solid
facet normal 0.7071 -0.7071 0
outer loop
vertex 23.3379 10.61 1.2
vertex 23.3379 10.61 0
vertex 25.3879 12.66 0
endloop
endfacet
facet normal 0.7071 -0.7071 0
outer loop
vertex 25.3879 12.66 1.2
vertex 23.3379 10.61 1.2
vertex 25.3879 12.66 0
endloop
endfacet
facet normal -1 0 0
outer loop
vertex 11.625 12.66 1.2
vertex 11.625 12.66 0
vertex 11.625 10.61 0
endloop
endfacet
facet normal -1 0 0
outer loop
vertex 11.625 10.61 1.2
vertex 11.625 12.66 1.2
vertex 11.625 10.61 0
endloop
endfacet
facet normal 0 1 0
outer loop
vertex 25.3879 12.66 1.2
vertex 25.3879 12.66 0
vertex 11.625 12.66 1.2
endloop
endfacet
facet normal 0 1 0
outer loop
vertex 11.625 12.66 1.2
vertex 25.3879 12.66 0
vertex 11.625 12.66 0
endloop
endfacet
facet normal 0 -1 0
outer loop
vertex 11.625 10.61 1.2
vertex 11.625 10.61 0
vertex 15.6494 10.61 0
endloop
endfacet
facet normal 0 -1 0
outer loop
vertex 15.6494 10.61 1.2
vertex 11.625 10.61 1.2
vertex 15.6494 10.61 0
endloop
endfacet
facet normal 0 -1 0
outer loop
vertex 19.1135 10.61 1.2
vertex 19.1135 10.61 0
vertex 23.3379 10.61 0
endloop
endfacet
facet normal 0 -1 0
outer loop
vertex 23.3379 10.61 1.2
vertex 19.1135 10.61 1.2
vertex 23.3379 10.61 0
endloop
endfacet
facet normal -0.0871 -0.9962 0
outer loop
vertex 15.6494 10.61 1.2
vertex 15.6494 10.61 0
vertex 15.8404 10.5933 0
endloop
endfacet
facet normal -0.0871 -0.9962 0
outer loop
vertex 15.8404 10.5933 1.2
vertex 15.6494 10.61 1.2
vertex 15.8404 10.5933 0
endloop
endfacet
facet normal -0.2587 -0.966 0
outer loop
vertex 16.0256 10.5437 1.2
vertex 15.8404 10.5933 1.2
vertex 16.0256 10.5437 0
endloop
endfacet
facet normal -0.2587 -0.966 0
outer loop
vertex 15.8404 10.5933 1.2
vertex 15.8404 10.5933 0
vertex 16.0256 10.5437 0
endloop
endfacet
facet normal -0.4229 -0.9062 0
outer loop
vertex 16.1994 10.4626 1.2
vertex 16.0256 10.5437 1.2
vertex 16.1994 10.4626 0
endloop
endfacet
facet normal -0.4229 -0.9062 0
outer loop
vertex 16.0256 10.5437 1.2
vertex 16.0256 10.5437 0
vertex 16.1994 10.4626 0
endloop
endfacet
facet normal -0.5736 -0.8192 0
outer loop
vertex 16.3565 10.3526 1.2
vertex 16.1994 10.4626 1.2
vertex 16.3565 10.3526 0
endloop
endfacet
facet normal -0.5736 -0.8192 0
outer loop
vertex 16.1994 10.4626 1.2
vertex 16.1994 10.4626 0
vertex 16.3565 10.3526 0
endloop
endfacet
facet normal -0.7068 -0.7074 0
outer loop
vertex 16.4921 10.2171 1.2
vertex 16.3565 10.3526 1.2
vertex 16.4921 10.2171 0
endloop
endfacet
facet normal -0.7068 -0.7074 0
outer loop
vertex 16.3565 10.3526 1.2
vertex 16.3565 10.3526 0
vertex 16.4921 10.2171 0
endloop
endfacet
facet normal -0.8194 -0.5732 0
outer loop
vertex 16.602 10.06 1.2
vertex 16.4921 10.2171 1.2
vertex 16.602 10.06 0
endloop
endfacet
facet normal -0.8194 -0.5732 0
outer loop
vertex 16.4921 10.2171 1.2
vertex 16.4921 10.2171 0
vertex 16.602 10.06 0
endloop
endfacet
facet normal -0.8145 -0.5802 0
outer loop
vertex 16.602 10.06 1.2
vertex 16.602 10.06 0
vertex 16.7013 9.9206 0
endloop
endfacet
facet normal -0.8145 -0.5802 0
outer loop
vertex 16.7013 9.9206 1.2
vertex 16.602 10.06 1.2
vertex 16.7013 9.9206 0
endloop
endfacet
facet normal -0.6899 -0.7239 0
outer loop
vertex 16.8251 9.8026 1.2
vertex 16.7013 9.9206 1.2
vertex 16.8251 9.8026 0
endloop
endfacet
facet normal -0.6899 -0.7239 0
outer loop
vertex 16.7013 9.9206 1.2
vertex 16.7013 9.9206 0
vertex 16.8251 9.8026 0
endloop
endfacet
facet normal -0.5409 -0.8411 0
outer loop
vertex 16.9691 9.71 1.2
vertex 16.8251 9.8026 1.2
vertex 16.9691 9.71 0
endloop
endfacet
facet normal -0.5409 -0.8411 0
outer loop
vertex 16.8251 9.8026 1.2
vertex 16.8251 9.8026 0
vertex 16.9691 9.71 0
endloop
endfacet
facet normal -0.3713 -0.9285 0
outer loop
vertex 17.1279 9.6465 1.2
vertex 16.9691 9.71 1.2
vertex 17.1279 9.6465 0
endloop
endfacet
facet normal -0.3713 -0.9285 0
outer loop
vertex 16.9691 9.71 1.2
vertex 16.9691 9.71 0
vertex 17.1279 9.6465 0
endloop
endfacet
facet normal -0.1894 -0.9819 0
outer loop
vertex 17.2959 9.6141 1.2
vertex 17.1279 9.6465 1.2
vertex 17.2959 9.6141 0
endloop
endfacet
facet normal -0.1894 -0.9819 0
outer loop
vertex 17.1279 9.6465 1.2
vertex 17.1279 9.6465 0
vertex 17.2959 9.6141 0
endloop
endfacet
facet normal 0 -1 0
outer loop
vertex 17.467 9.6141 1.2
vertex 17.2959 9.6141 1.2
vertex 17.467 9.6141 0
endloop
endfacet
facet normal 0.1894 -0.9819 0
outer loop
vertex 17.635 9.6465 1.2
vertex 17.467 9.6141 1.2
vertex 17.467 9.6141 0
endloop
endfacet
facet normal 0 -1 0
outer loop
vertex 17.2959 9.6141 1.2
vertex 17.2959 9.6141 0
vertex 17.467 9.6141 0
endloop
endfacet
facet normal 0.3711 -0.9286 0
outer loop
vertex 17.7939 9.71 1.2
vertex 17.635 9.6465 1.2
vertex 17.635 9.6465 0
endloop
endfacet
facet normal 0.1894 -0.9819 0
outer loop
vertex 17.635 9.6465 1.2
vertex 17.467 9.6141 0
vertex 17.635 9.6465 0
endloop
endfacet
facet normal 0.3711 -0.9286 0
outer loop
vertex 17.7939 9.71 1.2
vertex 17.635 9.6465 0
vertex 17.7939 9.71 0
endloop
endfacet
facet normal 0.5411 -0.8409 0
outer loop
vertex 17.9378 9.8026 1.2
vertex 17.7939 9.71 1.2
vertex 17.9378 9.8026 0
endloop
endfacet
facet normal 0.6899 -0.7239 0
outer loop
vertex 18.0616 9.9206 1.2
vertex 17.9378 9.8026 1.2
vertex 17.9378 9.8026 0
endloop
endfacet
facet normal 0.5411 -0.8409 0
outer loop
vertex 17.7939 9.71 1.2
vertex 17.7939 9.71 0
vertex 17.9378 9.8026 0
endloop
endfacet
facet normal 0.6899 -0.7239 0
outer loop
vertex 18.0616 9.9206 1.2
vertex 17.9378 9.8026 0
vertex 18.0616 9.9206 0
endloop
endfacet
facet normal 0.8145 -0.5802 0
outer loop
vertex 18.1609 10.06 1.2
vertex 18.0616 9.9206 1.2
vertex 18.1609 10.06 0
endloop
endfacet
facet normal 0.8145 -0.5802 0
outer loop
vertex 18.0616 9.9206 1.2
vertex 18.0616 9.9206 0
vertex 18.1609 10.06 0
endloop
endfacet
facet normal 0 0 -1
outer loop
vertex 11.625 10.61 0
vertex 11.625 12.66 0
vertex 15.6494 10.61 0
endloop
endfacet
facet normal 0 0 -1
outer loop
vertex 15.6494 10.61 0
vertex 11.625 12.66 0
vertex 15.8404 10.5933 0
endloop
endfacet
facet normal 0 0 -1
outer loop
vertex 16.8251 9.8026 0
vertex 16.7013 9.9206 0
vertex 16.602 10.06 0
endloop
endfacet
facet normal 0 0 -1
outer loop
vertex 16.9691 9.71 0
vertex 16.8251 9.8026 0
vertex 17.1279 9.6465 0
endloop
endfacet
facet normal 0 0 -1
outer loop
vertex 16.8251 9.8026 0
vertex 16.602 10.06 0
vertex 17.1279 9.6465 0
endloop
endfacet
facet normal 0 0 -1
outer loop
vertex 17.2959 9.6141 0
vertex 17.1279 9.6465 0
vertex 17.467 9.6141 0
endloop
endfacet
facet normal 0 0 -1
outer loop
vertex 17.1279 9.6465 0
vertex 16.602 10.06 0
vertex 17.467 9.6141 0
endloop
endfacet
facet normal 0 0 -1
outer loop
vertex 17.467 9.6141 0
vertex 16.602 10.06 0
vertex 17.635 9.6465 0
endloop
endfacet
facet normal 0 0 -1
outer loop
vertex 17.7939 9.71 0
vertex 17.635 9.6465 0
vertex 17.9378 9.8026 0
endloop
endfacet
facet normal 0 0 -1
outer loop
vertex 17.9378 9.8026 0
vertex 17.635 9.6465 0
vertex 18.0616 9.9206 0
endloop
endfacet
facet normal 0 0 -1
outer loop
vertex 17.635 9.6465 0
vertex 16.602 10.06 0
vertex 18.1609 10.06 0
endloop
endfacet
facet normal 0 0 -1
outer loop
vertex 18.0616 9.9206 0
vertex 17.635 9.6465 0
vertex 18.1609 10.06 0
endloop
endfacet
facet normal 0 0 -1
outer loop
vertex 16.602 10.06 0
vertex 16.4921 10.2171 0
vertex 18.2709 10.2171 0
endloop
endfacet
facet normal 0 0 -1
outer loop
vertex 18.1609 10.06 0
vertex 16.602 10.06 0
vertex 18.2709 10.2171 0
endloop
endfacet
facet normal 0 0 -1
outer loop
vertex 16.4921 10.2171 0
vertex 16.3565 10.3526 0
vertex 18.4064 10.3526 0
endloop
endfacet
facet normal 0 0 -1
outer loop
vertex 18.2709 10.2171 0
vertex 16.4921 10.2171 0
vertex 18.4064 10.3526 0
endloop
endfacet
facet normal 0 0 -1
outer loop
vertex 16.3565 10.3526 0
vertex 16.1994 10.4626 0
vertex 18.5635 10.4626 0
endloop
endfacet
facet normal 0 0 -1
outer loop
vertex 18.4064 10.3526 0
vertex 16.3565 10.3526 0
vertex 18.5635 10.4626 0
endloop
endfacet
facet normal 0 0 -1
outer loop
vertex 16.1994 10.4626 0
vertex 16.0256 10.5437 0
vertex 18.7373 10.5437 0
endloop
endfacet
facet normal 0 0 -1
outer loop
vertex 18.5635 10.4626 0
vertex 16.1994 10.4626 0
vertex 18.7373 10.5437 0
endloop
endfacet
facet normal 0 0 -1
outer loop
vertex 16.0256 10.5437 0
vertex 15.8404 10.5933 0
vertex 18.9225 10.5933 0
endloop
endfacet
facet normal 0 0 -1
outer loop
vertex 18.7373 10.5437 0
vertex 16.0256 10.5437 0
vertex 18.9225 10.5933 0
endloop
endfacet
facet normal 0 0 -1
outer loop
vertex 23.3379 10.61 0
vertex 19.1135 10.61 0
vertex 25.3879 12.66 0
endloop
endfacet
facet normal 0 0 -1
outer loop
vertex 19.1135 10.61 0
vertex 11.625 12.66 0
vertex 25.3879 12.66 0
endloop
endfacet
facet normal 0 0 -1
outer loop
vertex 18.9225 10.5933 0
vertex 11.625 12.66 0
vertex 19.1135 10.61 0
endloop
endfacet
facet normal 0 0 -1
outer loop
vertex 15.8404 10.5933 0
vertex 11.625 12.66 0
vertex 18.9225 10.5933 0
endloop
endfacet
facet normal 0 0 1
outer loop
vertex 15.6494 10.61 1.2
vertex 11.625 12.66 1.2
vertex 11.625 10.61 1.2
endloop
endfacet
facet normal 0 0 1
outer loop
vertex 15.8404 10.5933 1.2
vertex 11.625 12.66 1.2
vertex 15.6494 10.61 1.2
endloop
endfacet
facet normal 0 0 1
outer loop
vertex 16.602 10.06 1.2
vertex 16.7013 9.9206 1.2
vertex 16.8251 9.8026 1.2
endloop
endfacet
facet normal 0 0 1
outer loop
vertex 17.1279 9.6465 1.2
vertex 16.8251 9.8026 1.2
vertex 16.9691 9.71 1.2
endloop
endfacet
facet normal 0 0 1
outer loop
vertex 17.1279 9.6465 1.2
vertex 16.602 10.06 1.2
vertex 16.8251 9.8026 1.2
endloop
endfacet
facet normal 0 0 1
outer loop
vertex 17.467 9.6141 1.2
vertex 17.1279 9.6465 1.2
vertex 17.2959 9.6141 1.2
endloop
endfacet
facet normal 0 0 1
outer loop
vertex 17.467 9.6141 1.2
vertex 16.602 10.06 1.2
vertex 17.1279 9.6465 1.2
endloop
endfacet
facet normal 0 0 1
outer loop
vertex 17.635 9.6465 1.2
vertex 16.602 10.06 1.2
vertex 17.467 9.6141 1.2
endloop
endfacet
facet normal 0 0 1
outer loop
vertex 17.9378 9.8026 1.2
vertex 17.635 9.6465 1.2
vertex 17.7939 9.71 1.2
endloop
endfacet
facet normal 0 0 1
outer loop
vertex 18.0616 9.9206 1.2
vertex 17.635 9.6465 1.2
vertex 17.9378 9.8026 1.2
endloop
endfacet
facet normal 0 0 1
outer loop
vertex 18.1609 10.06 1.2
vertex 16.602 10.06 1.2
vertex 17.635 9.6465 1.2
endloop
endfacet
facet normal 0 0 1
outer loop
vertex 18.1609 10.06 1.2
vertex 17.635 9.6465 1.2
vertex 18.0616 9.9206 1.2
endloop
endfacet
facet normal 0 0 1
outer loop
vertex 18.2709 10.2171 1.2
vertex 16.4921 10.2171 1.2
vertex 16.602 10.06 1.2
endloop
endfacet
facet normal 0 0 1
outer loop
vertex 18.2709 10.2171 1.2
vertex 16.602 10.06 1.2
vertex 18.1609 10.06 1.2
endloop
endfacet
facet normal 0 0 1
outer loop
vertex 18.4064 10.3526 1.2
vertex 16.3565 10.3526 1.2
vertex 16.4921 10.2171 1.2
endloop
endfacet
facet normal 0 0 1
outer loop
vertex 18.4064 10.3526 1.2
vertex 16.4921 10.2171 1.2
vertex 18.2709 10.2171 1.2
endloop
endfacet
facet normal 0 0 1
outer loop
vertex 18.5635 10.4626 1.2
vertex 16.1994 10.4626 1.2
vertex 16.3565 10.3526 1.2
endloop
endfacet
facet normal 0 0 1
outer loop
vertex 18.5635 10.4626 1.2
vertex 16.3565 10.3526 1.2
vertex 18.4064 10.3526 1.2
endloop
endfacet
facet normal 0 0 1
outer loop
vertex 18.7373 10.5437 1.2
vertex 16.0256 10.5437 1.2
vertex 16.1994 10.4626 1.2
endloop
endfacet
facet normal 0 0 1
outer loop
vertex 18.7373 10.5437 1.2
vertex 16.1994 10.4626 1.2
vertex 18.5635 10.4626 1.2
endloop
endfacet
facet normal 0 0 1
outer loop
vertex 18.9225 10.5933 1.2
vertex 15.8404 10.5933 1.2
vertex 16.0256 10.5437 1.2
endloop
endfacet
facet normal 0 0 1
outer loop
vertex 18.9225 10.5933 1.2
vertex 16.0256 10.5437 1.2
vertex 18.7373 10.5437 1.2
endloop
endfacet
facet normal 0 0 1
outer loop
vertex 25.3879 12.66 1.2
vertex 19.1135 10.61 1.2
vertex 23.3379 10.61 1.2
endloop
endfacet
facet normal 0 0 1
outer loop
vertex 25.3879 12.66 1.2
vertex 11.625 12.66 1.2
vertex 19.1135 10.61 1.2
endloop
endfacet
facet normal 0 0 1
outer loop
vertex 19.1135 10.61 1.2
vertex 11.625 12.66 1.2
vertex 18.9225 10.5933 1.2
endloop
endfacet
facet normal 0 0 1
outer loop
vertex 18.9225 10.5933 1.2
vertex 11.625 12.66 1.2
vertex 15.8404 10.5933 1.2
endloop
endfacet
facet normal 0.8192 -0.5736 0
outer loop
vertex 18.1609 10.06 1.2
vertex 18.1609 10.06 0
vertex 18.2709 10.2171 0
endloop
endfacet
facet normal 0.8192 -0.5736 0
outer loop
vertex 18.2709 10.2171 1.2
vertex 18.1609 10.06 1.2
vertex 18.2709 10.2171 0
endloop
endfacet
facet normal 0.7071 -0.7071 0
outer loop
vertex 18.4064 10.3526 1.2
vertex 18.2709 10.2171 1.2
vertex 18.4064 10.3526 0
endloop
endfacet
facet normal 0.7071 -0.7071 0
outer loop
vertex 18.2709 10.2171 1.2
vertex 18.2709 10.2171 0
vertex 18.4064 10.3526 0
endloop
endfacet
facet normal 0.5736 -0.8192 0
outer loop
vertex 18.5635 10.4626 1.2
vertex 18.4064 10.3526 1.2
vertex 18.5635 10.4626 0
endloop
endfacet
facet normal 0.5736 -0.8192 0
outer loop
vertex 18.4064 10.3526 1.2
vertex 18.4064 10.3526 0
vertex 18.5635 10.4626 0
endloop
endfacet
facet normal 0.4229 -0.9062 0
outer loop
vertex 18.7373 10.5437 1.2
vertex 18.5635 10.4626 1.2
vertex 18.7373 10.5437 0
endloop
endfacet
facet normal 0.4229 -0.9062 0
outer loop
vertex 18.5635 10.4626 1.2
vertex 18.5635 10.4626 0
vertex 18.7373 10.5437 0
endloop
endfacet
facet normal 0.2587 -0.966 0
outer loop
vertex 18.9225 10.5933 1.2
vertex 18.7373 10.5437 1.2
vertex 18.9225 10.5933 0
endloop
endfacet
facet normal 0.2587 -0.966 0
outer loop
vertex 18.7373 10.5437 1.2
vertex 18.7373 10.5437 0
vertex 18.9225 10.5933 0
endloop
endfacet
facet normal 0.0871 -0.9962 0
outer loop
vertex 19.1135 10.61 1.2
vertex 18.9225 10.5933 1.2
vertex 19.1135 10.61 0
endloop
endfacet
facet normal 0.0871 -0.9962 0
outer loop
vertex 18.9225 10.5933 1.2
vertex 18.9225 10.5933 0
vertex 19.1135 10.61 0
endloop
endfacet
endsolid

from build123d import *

# Parameters (mm, degrees)
BOSS_EXTRUDE1_DEPTH = 1.2


with BuildPart() as part:
    # Sketch1 → Boss-Extrude1 (new body)
    with BuildSketch(Plane.XY):
        with BuildLine():
            Line((23.337922061, 10.61), (25.387922061, 12.66))
            Line((25.387922061, 12.66), (11.625, 12.66))
            Line((11.625, 12.66), (11.625, 10.61))
            Line((11.625, 10.61), (15.649410223, 10.61))
            ThreePointArc((15.649410223, 10.61), (16.199410223, 10.462627944), (16.602038167, 10.06))
            ThreePointArc((16.602038167, 10.06), (17.381461031, 9.61), (18.160883894, 10.06))
            ThreePointArc((18.160883894, 10.06), (18.563511838, 10.462627944), (19.113511838, 10.61))
            Line((19.113511838, 10.61), (23.337922061, 10.61))
        make_face()
    extrude(amount=BOSS_EXTRUDE1_DEPTH)


solid = part.part
